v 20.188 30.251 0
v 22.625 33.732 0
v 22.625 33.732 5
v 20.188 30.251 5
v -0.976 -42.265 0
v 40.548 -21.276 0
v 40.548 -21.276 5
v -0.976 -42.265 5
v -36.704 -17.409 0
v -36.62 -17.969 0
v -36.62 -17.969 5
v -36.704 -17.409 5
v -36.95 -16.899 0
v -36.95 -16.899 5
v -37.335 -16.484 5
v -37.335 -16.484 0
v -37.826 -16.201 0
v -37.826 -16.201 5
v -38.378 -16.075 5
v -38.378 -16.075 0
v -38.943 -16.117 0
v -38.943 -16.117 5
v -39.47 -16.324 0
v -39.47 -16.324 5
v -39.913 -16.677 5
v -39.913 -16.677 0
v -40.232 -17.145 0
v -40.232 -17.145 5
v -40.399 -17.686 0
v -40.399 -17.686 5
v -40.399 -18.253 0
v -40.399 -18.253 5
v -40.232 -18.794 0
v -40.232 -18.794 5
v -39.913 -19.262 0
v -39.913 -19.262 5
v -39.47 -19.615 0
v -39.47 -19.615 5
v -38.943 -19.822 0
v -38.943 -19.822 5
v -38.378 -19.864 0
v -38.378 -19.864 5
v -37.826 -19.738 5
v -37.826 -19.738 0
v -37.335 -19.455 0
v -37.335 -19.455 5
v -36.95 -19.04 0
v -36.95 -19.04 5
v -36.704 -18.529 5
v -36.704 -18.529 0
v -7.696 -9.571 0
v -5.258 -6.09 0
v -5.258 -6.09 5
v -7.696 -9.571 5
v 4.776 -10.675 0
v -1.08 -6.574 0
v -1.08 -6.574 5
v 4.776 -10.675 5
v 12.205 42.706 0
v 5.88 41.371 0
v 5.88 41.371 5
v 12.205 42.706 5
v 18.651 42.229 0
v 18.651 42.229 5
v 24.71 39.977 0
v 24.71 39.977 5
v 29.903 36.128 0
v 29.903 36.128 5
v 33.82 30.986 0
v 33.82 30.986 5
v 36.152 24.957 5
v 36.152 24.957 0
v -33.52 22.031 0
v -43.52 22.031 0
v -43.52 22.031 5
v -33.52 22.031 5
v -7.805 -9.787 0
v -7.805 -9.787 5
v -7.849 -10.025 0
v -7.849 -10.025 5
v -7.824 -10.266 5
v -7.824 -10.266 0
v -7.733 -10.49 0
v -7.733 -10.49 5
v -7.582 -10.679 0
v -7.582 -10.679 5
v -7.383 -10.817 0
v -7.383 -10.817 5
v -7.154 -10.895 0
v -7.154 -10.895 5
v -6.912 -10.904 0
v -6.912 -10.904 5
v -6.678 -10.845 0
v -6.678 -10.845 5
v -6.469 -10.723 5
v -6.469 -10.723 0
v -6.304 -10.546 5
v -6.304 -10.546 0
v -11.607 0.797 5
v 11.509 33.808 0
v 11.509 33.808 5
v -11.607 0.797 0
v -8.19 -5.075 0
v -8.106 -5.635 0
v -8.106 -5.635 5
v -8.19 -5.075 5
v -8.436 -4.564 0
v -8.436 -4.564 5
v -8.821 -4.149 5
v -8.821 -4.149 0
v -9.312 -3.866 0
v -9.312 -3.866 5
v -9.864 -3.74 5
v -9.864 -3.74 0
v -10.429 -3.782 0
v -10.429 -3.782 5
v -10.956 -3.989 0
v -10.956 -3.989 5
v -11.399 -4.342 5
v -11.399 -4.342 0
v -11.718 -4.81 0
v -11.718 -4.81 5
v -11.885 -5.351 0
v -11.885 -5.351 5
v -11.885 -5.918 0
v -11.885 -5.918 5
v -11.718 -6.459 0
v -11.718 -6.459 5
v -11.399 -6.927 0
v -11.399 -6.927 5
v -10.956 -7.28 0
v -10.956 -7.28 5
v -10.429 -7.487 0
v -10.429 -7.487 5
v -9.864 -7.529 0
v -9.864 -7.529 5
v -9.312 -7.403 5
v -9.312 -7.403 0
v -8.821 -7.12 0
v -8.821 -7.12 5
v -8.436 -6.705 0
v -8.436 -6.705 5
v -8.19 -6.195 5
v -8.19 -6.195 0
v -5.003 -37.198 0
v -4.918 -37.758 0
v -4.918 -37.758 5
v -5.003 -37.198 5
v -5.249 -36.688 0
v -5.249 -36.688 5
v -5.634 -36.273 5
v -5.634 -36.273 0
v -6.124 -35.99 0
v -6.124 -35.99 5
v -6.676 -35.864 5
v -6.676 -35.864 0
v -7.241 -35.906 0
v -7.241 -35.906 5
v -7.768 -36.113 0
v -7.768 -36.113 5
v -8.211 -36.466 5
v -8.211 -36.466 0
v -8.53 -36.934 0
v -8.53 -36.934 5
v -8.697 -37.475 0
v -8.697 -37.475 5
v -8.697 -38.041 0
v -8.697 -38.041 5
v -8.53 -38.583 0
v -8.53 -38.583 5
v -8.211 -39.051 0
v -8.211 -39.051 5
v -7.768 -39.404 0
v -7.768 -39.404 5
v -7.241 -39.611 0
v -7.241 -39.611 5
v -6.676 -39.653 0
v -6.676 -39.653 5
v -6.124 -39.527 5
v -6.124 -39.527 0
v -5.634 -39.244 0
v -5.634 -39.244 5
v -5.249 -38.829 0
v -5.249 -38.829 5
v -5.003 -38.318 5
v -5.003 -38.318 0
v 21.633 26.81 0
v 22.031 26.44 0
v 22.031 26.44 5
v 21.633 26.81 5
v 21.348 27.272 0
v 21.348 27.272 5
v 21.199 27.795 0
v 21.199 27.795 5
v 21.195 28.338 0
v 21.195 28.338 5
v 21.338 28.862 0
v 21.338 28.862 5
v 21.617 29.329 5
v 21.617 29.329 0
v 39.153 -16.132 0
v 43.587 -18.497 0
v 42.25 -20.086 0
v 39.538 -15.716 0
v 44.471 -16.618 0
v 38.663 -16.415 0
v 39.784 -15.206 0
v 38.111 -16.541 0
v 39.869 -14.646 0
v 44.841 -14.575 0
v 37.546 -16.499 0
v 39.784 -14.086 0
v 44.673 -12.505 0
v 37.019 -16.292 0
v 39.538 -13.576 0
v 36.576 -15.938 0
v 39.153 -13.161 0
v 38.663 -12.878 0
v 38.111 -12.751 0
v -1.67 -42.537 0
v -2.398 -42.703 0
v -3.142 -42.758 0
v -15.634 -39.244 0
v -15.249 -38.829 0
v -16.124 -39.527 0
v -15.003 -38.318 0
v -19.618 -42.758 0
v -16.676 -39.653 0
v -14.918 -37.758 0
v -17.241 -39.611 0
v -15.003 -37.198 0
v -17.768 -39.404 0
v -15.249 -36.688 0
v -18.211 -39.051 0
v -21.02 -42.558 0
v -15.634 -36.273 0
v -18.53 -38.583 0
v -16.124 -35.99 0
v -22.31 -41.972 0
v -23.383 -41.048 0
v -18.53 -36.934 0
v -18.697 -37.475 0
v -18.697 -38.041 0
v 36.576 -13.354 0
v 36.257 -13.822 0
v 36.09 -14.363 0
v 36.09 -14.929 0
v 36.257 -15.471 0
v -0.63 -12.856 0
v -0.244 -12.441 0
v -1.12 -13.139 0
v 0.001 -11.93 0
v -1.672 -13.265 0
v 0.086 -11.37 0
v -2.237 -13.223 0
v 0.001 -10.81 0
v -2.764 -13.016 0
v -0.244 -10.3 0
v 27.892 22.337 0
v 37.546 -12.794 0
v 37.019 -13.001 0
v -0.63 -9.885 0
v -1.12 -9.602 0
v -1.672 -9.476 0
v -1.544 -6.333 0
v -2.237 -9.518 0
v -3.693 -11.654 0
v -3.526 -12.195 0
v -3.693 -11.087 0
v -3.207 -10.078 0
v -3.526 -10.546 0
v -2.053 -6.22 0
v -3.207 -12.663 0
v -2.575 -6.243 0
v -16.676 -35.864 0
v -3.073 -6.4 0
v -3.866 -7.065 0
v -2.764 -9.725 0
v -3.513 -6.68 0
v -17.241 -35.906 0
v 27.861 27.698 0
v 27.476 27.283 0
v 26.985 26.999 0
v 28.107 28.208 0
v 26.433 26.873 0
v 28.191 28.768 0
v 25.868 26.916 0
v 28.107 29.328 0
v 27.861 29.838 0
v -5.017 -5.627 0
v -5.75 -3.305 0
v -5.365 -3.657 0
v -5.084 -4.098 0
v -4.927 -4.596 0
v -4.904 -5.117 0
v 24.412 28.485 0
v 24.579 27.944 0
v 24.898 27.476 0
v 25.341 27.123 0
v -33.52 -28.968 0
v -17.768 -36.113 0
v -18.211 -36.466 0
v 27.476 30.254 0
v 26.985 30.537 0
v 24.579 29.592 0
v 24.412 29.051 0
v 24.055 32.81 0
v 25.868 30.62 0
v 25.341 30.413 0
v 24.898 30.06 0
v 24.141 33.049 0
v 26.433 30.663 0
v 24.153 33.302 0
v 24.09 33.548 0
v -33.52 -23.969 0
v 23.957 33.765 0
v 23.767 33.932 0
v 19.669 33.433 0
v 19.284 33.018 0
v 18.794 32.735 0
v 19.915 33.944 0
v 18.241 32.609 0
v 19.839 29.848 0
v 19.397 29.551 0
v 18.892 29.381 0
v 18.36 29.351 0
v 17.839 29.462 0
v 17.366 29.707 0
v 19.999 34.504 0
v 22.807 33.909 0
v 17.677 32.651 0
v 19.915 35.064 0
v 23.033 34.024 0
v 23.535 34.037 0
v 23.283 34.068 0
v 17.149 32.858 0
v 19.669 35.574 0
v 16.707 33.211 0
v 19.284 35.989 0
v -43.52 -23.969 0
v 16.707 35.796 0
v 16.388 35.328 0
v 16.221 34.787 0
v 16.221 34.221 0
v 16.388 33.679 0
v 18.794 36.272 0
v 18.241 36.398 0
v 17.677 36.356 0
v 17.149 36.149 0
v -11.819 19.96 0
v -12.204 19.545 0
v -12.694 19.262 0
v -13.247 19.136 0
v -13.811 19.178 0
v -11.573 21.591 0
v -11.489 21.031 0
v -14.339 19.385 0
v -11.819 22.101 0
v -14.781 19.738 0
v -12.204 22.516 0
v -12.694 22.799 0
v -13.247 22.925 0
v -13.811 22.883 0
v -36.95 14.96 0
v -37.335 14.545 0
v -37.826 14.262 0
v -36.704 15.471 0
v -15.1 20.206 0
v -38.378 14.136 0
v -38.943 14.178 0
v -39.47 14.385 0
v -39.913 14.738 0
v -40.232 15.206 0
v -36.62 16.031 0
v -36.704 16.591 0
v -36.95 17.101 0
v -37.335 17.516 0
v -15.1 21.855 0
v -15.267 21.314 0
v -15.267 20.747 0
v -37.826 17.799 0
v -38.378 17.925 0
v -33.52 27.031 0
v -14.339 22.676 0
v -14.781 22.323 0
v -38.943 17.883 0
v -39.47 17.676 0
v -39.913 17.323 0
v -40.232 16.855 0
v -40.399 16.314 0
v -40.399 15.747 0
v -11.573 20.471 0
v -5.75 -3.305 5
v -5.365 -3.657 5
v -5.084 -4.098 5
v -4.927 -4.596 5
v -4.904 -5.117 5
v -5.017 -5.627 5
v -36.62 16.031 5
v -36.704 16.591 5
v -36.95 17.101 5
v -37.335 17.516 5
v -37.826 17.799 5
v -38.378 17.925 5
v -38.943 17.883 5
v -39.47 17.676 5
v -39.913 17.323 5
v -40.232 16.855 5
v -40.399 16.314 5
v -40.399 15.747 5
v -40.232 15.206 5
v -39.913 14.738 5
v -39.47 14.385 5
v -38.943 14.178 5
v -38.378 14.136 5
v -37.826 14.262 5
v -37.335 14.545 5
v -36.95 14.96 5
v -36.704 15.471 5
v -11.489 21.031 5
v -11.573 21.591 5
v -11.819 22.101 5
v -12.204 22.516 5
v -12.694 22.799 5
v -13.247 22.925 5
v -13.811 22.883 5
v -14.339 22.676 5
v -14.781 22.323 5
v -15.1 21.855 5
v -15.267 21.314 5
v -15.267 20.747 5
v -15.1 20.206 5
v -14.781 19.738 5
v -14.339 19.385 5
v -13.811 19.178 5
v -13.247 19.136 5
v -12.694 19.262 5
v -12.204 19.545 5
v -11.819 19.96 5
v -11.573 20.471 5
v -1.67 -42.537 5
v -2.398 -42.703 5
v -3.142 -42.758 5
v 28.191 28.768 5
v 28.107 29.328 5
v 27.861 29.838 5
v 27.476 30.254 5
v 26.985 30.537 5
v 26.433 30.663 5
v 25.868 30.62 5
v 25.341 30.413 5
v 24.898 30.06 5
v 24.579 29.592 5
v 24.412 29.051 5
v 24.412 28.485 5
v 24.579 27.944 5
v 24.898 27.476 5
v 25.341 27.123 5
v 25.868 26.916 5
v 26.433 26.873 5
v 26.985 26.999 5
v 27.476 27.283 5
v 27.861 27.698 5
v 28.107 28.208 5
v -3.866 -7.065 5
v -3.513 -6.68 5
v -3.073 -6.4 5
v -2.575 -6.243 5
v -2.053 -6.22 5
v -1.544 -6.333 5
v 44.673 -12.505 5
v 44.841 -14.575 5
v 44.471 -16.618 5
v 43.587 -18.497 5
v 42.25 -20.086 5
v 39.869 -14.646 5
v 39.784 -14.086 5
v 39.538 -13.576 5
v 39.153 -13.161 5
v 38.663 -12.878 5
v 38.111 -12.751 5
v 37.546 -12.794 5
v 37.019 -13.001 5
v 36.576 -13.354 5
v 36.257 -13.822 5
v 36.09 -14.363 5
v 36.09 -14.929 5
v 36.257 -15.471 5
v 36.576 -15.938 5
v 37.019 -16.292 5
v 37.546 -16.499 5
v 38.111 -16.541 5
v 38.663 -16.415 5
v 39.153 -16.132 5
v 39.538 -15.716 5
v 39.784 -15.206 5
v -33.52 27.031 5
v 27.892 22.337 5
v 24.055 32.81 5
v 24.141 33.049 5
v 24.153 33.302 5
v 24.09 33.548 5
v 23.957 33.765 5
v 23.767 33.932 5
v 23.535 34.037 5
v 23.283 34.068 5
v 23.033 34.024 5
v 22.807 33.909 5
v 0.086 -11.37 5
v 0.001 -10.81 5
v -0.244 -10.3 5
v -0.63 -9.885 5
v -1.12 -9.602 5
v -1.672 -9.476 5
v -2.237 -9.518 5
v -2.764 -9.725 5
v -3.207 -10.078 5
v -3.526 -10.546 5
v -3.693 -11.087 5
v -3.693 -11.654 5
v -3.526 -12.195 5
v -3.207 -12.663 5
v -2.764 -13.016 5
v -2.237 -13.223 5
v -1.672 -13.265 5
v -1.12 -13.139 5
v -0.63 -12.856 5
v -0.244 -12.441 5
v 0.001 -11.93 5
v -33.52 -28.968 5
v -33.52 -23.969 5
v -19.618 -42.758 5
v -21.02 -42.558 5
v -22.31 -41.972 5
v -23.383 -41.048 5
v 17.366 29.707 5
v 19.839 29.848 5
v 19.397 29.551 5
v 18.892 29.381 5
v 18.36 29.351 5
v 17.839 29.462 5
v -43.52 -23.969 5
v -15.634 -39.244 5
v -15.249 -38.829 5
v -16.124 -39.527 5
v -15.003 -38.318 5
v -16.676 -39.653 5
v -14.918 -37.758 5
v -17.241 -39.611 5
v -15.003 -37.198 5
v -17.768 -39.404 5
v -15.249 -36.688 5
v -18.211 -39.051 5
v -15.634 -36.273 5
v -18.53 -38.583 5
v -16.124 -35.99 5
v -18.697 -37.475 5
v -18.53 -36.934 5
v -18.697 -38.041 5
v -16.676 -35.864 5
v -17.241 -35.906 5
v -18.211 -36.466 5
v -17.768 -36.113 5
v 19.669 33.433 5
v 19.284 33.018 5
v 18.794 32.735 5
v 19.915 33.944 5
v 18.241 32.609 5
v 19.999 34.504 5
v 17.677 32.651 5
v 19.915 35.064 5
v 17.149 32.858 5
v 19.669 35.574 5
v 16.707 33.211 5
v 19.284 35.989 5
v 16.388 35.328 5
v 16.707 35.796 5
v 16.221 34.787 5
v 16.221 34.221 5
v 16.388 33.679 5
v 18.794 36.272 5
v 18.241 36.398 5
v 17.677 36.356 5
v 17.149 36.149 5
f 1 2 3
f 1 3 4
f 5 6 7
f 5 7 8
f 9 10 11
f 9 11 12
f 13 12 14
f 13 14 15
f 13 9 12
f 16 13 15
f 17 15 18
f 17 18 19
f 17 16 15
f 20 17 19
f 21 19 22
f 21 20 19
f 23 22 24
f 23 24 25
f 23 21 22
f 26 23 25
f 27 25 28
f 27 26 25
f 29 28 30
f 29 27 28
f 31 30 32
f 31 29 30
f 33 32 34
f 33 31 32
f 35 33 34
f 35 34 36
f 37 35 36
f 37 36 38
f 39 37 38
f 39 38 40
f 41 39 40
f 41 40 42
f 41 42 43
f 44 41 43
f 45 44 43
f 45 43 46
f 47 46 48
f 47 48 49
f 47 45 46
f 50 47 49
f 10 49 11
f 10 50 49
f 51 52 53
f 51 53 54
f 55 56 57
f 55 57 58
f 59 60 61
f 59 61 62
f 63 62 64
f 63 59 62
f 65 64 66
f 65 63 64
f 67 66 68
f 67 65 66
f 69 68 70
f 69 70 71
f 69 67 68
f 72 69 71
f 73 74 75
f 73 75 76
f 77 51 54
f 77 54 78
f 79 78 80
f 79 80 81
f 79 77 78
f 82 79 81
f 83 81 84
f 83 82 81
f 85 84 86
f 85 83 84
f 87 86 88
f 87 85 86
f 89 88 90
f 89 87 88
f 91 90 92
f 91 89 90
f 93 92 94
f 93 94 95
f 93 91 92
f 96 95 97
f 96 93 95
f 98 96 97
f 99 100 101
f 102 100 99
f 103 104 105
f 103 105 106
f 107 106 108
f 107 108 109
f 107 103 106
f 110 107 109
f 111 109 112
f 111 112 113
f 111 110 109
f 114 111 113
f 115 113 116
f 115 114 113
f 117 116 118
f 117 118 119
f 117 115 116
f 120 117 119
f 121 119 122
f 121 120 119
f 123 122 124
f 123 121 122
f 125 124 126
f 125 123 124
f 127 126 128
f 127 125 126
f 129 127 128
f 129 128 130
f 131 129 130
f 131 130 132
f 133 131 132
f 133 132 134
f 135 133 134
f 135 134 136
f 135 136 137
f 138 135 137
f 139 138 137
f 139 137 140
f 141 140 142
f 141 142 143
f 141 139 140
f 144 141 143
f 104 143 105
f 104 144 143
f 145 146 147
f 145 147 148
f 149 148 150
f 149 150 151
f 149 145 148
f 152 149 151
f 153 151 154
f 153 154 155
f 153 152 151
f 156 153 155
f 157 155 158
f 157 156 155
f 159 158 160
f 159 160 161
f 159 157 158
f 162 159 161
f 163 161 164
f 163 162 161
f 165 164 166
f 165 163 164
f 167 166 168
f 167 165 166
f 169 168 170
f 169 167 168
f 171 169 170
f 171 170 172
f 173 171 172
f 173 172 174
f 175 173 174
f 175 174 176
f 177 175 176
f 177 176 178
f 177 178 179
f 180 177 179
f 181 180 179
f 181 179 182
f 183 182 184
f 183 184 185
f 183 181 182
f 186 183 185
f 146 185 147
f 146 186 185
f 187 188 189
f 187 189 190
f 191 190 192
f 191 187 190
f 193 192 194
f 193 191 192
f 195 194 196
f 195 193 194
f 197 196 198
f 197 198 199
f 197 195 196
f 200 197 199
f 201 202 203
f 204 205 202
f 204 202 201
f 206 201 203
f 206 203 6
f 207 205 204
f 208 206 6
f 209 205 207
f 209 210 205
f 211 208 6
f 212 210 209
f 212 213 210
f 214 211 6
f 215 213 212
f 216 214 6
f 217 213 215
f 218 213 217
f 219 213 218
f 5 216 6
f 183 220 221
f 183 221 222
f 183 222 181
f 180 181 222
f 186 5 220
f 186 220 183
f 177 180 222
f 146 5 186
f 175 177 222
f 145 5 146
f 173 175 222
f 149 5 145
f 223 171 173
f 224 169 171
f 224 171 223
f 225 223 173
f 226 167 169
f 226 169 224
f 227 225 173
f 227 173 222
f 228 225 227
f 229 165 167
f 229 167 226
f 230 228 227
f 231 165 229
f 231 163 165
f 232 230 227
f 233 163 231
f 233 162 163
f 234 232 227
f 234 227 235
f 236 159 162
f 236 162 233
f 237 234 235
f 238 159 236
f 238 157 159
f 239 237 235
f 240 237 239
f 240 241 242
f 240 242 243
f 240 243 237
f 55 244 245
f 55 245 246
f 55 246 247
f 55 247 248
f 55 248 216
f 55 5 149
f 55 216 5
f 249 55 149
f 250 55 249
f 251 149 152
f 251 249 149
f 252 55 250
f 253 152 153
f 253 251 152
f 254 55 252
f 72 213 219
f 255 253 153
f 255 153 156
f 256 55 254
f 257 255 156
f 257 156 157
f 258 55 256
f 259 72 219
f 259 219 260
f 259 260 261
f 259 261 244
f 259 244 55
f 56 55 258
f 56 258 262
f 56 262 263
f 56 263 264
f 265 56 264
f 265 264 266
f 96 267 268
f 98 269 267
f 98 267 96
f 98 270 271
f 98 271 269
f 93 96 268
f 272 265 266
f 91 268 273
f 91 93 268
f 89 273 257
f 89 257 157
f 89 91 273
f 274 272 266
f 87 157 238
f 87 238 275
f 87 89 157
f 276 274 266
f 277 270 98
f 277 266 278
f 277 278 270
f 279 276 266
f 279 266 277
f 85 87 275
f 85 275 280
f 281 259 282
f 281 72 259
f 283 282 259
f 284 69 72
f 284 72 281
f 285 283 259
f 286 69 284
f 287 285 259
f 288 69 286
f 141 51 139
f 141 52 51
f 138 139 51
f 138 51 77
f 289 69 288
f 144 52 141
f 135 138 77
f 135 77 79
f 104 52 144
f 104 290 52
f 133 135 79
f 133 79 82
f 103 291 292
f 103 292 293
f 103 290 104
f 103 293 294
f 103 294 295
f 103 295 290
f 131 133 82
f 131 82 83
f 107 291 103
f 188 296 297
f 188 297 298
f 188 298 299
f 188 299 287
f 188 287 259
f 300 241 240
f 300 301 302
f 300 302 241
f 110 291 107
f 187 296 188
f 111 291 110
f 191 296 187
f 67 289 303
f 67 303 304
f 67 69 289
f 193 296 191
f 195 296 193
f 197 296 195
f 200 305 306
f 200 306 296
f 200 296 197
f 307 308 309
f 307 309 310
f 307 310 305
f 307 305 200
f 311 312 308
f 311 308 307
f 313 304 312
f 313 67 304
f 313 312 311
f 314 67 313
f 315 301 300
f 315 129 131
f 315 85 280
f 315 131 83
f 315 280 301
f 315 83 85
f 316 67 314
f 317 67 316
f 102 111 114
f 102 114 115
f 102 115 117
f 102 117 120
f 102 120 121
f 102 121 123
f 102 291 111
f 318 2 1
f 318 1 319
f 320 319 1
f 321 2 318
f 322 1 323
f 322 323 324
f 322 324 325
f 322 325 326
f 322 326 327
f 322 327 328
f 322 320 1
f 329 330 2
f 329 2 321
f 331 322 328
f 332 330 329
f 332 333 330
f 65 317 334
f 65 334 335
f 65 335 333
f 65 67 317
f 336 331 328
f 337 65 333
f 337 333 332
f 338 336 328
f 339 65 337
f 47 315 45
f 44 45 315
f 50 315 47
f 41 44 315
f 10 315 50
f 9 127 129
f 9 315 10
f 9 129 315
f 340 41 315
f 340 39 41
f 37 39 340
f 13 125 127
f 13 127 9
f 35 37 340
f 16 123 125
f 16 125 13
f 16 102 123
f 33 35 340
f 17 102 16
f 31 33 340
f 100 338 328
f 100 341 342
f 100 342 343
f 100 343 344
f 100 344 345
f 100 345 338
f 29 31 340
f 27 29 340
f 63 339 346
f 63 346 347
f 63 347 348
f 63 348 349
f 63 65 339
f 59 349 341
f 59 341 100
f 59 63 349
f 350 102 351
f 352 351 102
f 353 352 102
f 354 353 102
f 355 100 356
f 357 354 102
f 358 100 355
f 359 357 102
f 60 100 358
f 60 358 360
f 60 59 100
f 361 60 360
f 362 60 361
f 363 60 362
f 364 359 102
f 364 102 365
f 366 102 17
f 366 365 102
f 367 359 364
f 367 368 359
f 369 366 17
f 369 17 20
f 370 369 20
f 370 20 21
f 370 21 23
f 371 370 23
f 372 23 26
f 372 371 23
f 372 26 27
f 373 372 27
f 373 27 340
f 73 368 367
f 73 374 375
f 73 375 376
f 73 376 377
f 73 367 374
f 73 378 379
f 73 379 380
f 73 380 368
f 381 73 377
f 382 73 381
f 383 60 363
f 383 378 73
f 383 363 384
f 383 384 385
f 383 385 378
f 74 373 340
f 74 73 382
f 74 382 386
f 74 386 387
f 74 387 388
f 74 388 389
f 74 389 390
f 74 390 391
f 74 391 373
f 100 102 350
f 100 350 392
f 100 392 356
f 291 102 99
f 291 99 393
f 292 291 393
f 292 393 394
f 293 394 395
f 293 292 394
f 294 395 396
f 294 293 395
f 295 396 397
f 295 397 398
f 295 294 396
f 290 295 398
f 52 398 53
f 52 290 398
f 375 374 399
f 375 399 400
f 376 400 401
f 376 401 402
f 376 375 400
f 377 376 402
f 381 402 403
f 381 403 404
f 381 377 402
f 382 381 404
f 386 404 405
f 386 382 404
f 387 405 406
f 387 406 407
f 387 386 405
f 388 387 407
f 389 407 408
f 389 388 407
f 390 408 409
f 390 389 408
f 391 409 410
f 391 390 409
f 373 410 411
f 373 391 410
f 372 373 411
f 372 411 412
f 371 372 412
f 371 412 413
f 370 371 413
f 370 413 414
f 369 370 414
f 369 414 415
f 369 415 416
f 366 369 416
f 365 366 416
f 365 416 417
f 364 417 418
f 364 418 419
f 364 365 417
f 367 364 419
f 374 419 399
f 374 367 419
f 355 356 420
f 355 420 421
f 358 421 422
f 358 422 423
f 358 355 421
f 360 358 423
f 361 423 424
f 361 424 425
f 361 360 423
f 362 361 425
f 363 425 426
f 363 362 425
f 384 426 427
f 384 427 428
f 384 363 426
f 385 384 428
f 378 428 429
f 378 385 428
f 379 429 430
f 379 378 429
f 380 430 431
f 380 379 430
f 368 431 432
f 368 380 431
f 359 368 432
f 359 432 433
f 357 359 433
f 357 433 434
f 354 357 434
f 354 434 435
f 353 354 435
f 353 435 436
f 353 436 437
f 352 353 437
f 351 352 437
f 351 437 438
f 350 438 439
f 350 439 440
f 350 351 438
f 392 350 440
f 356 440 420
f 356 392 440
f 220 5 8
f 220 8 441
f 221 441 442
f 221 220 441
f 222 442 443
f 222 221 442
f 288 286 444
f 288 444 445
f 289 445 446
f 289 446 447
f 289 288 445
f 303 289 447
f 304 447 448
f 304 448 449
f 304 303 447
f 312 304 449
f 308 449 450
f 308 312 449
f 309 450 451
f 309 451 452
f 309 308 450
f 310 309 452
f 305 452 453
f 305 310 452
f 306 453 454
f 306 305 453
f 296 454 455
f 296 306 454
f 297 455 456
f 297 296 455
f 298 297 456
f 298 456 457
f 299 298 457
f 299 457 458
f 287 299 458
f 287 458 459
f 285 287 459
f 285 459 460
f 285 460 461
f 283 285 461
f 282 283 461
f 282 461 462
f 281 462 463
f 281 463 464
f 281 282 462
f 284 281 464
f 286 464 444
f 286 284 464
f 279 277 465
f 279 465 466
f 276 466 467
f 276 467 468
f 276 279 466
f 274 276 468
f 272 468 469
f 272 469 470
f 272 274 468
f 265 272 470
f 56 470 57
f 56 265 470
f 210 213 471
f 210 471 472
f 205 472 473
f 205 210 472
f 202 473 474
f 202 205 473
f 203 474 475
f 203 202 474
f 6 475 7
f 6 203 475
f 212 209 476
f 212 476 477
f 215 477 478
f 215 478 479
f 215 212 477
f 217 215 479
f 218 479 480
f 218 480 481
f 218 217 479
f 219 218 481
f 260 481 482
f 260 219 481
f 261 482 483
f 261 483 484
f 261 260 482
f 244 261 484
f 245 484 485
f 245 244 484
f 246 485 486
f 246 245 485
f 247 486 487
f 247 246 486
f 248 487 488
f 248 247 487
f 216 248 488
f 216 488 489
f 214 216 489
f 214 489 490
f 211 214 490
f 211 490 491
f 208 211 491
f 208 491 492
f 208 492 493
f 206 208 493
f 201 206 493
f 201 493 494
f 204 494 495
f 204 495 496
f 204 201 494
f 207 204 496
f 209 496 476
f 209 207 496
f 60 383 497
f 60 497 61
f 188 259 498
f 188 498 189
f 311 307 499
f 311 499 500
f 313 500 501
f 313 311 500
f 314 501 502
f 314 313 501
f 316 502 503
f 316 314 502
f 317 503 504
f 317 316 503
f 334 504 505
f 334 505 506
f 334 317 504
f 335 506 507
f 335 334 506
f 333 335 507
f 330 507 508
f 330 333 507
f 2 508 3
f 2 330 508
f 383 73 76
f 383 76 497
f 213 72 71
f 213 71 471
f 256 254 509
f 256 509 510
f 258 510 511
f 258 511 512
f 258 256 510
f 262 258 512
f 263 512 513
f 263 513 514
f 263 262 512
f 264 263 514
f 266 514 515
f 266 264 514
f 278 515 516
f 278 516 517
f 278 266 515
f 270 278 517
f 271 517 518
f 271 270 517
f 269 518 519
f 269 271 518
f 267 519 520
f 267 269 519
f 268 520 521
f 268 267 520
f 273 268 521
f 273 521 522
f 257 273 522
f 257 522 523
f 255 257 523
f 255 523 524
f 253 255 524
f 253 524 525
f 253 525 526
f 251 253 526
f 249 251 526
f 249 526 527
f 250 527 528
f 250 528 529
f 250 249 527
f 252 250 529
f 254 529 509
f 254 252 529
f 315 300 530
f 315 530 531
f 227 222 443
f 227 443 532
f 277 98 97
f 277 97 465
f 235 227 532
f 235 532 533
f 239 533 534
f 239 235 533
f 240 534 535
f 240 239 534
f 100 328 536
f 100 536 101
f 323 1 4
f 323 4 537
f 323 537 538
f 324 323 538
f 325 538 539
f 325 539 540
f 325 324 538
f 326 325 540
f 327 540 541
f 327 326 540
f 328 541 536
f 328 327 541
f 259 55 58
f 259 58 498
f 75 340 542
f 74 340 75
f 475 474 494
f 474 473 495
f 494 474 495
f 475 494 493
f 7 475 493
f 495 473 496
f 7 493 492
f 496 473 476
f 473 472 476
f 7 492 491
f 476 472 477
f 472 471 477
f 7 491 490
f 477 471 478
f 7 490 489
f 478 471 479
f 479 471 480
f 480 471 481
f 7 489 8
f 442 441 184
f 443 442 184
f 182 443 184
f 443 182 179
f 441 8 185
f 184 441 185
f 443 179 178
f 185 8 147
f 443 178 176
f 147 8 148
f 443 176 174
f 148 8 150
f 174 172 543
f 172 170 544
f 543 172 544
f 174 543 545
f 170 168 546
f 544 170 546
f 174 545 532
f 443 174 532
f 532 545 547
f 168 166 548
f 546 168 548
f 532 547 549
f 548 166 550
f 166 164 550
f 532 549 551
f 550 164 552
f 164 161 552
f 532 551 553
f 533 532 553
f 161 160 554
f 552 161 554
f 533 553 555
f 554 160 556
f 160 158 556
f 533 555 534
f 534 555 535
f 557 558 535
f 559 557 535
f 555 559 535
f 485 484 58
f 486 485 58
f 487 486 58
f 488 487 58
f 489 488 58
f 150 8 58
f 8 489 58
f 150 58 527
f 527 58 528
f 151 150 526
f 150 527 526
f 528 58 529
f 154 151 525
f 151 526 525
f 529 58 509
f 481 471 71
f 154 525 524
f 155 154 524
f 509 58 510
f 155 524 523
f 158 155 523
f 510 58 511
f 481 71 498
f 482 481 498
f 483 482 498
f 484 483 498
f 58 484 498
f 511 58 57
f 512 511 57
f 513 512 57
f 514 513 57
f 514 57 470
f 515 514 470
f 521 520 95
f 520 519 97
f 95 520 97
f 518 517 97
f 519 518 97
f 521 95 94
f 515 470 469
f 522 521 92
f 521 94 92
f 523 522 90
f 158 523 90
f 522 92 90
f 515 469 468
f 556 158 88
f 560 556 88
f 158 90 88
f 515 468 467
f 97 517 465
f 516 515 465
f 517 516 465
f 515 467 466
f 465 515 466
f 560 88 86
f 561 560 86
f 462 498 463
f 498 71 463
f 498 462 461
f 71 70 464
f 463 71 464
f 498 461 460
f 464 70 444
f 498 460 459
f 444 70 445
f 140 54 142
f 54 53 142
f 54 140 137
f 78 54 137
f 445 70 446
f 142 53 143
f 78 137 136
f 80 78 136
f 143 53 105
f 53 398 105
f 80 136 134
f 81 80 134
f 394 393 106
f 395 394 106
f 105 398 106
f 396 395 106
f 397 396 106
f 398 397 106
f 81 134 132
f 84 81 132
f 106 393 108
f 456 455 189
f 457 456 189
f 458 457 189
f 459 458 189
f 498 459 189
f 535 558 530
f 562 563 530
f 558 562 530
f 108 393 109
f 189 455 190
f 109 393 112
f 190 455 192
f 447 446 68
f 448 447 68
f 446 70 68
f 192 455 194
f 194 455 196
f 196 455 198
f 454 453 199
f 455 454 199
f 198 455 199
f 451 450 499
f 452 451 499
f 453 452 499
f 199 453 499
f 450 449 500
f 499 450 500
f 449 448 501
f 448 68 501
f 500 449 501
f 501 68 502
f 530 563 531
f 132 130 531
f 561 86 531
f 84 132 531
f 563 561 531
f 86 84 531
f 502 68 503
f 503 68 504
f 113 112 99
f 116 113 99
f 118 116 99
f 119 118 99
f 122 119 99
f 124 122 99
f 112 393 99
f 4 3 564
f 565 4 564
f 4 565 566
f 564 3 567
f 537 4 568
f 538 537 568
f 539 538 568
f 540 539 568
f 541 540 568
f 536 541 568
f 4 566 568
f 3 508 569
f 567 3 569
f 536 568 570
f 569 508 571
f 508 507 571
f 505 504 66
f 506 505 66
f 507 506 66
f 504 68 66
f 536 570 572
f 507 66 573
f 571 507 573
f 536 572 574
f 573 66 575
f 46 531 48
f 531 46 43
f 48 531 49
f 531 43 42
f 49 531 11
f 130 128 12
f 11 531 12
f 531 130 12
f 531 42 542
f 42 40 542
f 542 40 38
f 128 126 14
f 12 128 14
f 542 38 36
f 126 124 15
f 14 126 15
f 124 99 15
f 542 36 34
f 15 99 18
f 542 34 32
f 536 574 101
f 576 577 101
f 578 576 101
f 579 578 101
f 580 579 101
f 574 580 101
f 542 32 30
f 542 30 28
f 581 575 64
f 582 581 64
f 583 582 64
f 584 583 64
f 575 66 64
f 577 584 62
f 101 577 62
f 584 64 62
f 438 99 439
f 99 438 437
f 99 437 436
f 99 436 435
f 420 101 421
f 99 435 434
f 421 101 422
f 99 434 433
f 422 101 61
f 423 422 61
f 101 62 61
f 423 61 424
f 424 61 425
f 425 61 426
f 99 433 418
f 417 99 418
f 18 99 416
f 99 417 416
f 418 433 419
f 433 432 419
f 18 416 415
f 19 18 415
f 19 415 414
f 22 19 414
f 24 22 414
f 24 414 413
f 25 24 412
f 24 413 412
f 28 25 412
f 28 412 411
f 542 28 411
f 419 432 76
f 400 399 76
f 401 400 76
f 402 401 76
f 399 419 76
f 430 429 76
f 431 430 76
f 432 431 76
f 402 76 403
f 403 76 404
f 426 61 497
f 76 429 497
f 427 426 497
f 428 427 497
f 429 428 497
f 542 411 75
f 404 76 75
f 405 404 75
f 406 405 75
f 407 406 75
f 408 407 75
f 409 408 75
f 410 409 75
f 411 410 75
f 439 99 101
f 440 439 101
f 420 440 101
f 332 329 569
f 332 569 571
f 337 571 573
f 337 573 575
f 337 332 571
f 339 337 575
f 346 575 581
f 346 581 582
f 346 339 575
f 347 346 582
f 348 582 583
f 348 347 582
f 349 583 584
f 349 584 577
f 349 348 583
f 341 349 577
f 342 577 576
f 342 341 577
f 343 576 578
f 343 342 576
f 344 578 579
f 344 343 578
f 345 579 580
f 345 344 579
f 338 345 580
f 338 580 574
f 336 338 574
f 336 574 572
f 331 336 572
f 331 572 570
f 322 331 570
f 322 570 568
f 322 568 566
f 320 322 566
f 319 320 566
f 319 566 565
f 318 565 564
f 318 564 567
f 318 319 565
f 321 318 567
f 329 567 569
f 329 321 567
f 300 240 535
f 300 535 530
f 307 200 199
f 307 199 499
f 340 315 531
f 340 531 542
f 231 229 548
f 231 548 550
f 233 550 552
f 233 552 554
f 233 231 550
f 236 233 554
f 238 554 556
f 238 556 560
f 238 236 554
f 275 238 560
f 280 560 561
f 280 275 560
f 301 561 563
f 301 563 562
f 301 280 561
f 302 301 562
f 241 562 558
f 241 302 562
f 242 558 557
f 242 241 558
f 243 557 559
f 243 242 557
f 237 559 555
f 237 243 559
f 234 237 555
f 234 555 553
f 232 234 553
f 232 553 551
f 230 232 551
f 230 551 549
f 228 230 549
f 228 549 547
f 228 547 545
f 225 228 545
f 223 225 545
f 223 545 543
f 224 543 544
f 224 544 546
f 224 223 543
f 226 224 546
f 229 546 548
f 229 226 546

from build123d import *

# Parameters (mm, degrees)
ESQUISSE1_R        = 1.9
BOSS_EXTRU_1_DEPTH = 5


with BuildPart() as part:
    # Esquisse1 → Boss.-Extru.1 (new body)
    with BuildSketch(Plane.XY):
        with BuildLine():
            Line((40.548338426, -21.276277818), (-0.975727052, -42.264773686))
            ThreePointArc((-0.975727052, -42.264773686), (-2.030907408, -42.633295828), (-3.141586831, -42.758217285))
            Line((-3.141586831, -42.758217285), (-19.618188193, -42.758217285))
            ThreePointArc((-19.618188193, -42.758217285), (-21.685859542, -42.310660648), (-23.383370665, -41.048112535))
            Line((-23.383370665, -41.048112535), (-33.519906154, -28.967859949))
            Line((-33.519906154, -28.967859949), (-33.519906154, -23.969415955))
            Line((-33.519906154, -23.969415955), (-43.519906154, -23.969415955))
            Line((-43.519906154, -23.969415955), (-43.519906154, 22.030584045))
            Line((-43.519906154, 22.030584045), (-33.519906154, 22.030584045))
            Line((-33.519906154, 22.030584045), (-33.519906154, 27.030582734))
            Line((-33.519906154, 27.030582734), (5.8804708, 41.371147503))
            ThreePointArc((5.8804708, 41.371147503), (24.71028401, 39.977143129), (36.151646844, 24.957145453))
            Line((36.151646844, 24.957145453), (44.672795688, -12.50542283))
            ThreePointArc((44.672795688, -12.50542283), (44.089997655, -17.586546272), (40.548338426, -21.276277818))
        make_face()
        with Locations((37.968513549, -14.646168575)):
            Circle(ESQUISSE1_R, mode=Mode.SUBTRACT)
        with Locations((26.290921771, 28.768039745)):
            Circle(ESQUISSE1_R, mode=Mode.SUBTRACT)
        with Locations((18.099401328, 34.503804109)):
            Circle(ESQUISSE1_R, mode=Mode.SUBTRACT)
        with Locations((-1.81432361, -11.370410425)):
            Circle(ESQUISSE1_R, mode=Mode.SUBTRACT)
        with Locations((-10.005844053, -5.634646061)):
            Circle(ESQUISSE1_R, mode=Mode.SUBTRACT)
        with Locations((-13.38853652, 21.030583318)):
            Circle(ESQUISSE1_R, mode=Mode.SUBTRACT)
        with Locations((-6.818359545, -37.758216658)):
            Circle(ESQUISSE1_R, mode=Mode.SUBTRACT)
        with Locations((-16.818359545, -37.758216658)):
            Circle(ESQUISSE1_R, mode=Mode.SUBTRACT)
        with Locations((-38.519906154, -17.969415955)):
            Circle(ESQUISSE1_R, mode=Mode.SUBTRACT)
        with Locations((-38.519906154, 16.030584045)):
            Circle(ESQUISSE1_R, mode=Mode.SUBTRACT)
        with BuildLine():
            Line((21.617307412, 29.328732493), (24.05500749, 32.810128977))
            ThreePointArc((24.05500749, 32.810128977), (23.766600359, 33.932469516), (22.625252159, 33.732091761))
            Line((22.625252159, 33.732091761), (20.187552449, 30.250695803))
            ThreePointArc((20.187552449, 30.250695803), (18.892160946, 29.381199086), (17.366350313, 29.706722658))
            Line((17.366350313, 29.706722658), (11.508582376, 33.808377058))
            Line((11.508582376, 33.808377058), (-11.606548602, 0.796549047))
            Line((-11.606548602, 0.796549047), (-5.749613357, -3.304522496))
            ThreePointArc((-5.749613357, -3.304522496), (-4.927150936, -4.595530225), (-5.258462389, -6.089979325))
            Line((-5.258462389, -6.089979325), (-7.696162511, -9.571375872))
            ThreePointArc((-7.696162511, -9.571375872), (-7.487422906, -10.755197269), (-6.303601509, -10.546457664))
            Line((-6.303601509, -10.546457664), (-3.865901833, -7.065061754))
            ThreePointArc((-3.865901833, -7.065061754), (-2.574894061, -6.242599111), (-1.080444801, -6.573910562))
            Line((-1.080444801, -6.573910562), (4.776491193, -10.67498149))
            Line((4.776491193, -10.67498149), (27.891620971, 22.336844808))
            Line((27.891620971, 22.336844808), (22.031293977, 26.440291454))
            ThreePointArc((22.031293977, 26.440291454), (21.198678089, 27.79484445), (21.617307412, 29.328732493))
        make_face(mode=Mode.SUBTRACT)
    extrude(amount=BOSS_EXTRU_1_DEPTH)


solid = part.part
